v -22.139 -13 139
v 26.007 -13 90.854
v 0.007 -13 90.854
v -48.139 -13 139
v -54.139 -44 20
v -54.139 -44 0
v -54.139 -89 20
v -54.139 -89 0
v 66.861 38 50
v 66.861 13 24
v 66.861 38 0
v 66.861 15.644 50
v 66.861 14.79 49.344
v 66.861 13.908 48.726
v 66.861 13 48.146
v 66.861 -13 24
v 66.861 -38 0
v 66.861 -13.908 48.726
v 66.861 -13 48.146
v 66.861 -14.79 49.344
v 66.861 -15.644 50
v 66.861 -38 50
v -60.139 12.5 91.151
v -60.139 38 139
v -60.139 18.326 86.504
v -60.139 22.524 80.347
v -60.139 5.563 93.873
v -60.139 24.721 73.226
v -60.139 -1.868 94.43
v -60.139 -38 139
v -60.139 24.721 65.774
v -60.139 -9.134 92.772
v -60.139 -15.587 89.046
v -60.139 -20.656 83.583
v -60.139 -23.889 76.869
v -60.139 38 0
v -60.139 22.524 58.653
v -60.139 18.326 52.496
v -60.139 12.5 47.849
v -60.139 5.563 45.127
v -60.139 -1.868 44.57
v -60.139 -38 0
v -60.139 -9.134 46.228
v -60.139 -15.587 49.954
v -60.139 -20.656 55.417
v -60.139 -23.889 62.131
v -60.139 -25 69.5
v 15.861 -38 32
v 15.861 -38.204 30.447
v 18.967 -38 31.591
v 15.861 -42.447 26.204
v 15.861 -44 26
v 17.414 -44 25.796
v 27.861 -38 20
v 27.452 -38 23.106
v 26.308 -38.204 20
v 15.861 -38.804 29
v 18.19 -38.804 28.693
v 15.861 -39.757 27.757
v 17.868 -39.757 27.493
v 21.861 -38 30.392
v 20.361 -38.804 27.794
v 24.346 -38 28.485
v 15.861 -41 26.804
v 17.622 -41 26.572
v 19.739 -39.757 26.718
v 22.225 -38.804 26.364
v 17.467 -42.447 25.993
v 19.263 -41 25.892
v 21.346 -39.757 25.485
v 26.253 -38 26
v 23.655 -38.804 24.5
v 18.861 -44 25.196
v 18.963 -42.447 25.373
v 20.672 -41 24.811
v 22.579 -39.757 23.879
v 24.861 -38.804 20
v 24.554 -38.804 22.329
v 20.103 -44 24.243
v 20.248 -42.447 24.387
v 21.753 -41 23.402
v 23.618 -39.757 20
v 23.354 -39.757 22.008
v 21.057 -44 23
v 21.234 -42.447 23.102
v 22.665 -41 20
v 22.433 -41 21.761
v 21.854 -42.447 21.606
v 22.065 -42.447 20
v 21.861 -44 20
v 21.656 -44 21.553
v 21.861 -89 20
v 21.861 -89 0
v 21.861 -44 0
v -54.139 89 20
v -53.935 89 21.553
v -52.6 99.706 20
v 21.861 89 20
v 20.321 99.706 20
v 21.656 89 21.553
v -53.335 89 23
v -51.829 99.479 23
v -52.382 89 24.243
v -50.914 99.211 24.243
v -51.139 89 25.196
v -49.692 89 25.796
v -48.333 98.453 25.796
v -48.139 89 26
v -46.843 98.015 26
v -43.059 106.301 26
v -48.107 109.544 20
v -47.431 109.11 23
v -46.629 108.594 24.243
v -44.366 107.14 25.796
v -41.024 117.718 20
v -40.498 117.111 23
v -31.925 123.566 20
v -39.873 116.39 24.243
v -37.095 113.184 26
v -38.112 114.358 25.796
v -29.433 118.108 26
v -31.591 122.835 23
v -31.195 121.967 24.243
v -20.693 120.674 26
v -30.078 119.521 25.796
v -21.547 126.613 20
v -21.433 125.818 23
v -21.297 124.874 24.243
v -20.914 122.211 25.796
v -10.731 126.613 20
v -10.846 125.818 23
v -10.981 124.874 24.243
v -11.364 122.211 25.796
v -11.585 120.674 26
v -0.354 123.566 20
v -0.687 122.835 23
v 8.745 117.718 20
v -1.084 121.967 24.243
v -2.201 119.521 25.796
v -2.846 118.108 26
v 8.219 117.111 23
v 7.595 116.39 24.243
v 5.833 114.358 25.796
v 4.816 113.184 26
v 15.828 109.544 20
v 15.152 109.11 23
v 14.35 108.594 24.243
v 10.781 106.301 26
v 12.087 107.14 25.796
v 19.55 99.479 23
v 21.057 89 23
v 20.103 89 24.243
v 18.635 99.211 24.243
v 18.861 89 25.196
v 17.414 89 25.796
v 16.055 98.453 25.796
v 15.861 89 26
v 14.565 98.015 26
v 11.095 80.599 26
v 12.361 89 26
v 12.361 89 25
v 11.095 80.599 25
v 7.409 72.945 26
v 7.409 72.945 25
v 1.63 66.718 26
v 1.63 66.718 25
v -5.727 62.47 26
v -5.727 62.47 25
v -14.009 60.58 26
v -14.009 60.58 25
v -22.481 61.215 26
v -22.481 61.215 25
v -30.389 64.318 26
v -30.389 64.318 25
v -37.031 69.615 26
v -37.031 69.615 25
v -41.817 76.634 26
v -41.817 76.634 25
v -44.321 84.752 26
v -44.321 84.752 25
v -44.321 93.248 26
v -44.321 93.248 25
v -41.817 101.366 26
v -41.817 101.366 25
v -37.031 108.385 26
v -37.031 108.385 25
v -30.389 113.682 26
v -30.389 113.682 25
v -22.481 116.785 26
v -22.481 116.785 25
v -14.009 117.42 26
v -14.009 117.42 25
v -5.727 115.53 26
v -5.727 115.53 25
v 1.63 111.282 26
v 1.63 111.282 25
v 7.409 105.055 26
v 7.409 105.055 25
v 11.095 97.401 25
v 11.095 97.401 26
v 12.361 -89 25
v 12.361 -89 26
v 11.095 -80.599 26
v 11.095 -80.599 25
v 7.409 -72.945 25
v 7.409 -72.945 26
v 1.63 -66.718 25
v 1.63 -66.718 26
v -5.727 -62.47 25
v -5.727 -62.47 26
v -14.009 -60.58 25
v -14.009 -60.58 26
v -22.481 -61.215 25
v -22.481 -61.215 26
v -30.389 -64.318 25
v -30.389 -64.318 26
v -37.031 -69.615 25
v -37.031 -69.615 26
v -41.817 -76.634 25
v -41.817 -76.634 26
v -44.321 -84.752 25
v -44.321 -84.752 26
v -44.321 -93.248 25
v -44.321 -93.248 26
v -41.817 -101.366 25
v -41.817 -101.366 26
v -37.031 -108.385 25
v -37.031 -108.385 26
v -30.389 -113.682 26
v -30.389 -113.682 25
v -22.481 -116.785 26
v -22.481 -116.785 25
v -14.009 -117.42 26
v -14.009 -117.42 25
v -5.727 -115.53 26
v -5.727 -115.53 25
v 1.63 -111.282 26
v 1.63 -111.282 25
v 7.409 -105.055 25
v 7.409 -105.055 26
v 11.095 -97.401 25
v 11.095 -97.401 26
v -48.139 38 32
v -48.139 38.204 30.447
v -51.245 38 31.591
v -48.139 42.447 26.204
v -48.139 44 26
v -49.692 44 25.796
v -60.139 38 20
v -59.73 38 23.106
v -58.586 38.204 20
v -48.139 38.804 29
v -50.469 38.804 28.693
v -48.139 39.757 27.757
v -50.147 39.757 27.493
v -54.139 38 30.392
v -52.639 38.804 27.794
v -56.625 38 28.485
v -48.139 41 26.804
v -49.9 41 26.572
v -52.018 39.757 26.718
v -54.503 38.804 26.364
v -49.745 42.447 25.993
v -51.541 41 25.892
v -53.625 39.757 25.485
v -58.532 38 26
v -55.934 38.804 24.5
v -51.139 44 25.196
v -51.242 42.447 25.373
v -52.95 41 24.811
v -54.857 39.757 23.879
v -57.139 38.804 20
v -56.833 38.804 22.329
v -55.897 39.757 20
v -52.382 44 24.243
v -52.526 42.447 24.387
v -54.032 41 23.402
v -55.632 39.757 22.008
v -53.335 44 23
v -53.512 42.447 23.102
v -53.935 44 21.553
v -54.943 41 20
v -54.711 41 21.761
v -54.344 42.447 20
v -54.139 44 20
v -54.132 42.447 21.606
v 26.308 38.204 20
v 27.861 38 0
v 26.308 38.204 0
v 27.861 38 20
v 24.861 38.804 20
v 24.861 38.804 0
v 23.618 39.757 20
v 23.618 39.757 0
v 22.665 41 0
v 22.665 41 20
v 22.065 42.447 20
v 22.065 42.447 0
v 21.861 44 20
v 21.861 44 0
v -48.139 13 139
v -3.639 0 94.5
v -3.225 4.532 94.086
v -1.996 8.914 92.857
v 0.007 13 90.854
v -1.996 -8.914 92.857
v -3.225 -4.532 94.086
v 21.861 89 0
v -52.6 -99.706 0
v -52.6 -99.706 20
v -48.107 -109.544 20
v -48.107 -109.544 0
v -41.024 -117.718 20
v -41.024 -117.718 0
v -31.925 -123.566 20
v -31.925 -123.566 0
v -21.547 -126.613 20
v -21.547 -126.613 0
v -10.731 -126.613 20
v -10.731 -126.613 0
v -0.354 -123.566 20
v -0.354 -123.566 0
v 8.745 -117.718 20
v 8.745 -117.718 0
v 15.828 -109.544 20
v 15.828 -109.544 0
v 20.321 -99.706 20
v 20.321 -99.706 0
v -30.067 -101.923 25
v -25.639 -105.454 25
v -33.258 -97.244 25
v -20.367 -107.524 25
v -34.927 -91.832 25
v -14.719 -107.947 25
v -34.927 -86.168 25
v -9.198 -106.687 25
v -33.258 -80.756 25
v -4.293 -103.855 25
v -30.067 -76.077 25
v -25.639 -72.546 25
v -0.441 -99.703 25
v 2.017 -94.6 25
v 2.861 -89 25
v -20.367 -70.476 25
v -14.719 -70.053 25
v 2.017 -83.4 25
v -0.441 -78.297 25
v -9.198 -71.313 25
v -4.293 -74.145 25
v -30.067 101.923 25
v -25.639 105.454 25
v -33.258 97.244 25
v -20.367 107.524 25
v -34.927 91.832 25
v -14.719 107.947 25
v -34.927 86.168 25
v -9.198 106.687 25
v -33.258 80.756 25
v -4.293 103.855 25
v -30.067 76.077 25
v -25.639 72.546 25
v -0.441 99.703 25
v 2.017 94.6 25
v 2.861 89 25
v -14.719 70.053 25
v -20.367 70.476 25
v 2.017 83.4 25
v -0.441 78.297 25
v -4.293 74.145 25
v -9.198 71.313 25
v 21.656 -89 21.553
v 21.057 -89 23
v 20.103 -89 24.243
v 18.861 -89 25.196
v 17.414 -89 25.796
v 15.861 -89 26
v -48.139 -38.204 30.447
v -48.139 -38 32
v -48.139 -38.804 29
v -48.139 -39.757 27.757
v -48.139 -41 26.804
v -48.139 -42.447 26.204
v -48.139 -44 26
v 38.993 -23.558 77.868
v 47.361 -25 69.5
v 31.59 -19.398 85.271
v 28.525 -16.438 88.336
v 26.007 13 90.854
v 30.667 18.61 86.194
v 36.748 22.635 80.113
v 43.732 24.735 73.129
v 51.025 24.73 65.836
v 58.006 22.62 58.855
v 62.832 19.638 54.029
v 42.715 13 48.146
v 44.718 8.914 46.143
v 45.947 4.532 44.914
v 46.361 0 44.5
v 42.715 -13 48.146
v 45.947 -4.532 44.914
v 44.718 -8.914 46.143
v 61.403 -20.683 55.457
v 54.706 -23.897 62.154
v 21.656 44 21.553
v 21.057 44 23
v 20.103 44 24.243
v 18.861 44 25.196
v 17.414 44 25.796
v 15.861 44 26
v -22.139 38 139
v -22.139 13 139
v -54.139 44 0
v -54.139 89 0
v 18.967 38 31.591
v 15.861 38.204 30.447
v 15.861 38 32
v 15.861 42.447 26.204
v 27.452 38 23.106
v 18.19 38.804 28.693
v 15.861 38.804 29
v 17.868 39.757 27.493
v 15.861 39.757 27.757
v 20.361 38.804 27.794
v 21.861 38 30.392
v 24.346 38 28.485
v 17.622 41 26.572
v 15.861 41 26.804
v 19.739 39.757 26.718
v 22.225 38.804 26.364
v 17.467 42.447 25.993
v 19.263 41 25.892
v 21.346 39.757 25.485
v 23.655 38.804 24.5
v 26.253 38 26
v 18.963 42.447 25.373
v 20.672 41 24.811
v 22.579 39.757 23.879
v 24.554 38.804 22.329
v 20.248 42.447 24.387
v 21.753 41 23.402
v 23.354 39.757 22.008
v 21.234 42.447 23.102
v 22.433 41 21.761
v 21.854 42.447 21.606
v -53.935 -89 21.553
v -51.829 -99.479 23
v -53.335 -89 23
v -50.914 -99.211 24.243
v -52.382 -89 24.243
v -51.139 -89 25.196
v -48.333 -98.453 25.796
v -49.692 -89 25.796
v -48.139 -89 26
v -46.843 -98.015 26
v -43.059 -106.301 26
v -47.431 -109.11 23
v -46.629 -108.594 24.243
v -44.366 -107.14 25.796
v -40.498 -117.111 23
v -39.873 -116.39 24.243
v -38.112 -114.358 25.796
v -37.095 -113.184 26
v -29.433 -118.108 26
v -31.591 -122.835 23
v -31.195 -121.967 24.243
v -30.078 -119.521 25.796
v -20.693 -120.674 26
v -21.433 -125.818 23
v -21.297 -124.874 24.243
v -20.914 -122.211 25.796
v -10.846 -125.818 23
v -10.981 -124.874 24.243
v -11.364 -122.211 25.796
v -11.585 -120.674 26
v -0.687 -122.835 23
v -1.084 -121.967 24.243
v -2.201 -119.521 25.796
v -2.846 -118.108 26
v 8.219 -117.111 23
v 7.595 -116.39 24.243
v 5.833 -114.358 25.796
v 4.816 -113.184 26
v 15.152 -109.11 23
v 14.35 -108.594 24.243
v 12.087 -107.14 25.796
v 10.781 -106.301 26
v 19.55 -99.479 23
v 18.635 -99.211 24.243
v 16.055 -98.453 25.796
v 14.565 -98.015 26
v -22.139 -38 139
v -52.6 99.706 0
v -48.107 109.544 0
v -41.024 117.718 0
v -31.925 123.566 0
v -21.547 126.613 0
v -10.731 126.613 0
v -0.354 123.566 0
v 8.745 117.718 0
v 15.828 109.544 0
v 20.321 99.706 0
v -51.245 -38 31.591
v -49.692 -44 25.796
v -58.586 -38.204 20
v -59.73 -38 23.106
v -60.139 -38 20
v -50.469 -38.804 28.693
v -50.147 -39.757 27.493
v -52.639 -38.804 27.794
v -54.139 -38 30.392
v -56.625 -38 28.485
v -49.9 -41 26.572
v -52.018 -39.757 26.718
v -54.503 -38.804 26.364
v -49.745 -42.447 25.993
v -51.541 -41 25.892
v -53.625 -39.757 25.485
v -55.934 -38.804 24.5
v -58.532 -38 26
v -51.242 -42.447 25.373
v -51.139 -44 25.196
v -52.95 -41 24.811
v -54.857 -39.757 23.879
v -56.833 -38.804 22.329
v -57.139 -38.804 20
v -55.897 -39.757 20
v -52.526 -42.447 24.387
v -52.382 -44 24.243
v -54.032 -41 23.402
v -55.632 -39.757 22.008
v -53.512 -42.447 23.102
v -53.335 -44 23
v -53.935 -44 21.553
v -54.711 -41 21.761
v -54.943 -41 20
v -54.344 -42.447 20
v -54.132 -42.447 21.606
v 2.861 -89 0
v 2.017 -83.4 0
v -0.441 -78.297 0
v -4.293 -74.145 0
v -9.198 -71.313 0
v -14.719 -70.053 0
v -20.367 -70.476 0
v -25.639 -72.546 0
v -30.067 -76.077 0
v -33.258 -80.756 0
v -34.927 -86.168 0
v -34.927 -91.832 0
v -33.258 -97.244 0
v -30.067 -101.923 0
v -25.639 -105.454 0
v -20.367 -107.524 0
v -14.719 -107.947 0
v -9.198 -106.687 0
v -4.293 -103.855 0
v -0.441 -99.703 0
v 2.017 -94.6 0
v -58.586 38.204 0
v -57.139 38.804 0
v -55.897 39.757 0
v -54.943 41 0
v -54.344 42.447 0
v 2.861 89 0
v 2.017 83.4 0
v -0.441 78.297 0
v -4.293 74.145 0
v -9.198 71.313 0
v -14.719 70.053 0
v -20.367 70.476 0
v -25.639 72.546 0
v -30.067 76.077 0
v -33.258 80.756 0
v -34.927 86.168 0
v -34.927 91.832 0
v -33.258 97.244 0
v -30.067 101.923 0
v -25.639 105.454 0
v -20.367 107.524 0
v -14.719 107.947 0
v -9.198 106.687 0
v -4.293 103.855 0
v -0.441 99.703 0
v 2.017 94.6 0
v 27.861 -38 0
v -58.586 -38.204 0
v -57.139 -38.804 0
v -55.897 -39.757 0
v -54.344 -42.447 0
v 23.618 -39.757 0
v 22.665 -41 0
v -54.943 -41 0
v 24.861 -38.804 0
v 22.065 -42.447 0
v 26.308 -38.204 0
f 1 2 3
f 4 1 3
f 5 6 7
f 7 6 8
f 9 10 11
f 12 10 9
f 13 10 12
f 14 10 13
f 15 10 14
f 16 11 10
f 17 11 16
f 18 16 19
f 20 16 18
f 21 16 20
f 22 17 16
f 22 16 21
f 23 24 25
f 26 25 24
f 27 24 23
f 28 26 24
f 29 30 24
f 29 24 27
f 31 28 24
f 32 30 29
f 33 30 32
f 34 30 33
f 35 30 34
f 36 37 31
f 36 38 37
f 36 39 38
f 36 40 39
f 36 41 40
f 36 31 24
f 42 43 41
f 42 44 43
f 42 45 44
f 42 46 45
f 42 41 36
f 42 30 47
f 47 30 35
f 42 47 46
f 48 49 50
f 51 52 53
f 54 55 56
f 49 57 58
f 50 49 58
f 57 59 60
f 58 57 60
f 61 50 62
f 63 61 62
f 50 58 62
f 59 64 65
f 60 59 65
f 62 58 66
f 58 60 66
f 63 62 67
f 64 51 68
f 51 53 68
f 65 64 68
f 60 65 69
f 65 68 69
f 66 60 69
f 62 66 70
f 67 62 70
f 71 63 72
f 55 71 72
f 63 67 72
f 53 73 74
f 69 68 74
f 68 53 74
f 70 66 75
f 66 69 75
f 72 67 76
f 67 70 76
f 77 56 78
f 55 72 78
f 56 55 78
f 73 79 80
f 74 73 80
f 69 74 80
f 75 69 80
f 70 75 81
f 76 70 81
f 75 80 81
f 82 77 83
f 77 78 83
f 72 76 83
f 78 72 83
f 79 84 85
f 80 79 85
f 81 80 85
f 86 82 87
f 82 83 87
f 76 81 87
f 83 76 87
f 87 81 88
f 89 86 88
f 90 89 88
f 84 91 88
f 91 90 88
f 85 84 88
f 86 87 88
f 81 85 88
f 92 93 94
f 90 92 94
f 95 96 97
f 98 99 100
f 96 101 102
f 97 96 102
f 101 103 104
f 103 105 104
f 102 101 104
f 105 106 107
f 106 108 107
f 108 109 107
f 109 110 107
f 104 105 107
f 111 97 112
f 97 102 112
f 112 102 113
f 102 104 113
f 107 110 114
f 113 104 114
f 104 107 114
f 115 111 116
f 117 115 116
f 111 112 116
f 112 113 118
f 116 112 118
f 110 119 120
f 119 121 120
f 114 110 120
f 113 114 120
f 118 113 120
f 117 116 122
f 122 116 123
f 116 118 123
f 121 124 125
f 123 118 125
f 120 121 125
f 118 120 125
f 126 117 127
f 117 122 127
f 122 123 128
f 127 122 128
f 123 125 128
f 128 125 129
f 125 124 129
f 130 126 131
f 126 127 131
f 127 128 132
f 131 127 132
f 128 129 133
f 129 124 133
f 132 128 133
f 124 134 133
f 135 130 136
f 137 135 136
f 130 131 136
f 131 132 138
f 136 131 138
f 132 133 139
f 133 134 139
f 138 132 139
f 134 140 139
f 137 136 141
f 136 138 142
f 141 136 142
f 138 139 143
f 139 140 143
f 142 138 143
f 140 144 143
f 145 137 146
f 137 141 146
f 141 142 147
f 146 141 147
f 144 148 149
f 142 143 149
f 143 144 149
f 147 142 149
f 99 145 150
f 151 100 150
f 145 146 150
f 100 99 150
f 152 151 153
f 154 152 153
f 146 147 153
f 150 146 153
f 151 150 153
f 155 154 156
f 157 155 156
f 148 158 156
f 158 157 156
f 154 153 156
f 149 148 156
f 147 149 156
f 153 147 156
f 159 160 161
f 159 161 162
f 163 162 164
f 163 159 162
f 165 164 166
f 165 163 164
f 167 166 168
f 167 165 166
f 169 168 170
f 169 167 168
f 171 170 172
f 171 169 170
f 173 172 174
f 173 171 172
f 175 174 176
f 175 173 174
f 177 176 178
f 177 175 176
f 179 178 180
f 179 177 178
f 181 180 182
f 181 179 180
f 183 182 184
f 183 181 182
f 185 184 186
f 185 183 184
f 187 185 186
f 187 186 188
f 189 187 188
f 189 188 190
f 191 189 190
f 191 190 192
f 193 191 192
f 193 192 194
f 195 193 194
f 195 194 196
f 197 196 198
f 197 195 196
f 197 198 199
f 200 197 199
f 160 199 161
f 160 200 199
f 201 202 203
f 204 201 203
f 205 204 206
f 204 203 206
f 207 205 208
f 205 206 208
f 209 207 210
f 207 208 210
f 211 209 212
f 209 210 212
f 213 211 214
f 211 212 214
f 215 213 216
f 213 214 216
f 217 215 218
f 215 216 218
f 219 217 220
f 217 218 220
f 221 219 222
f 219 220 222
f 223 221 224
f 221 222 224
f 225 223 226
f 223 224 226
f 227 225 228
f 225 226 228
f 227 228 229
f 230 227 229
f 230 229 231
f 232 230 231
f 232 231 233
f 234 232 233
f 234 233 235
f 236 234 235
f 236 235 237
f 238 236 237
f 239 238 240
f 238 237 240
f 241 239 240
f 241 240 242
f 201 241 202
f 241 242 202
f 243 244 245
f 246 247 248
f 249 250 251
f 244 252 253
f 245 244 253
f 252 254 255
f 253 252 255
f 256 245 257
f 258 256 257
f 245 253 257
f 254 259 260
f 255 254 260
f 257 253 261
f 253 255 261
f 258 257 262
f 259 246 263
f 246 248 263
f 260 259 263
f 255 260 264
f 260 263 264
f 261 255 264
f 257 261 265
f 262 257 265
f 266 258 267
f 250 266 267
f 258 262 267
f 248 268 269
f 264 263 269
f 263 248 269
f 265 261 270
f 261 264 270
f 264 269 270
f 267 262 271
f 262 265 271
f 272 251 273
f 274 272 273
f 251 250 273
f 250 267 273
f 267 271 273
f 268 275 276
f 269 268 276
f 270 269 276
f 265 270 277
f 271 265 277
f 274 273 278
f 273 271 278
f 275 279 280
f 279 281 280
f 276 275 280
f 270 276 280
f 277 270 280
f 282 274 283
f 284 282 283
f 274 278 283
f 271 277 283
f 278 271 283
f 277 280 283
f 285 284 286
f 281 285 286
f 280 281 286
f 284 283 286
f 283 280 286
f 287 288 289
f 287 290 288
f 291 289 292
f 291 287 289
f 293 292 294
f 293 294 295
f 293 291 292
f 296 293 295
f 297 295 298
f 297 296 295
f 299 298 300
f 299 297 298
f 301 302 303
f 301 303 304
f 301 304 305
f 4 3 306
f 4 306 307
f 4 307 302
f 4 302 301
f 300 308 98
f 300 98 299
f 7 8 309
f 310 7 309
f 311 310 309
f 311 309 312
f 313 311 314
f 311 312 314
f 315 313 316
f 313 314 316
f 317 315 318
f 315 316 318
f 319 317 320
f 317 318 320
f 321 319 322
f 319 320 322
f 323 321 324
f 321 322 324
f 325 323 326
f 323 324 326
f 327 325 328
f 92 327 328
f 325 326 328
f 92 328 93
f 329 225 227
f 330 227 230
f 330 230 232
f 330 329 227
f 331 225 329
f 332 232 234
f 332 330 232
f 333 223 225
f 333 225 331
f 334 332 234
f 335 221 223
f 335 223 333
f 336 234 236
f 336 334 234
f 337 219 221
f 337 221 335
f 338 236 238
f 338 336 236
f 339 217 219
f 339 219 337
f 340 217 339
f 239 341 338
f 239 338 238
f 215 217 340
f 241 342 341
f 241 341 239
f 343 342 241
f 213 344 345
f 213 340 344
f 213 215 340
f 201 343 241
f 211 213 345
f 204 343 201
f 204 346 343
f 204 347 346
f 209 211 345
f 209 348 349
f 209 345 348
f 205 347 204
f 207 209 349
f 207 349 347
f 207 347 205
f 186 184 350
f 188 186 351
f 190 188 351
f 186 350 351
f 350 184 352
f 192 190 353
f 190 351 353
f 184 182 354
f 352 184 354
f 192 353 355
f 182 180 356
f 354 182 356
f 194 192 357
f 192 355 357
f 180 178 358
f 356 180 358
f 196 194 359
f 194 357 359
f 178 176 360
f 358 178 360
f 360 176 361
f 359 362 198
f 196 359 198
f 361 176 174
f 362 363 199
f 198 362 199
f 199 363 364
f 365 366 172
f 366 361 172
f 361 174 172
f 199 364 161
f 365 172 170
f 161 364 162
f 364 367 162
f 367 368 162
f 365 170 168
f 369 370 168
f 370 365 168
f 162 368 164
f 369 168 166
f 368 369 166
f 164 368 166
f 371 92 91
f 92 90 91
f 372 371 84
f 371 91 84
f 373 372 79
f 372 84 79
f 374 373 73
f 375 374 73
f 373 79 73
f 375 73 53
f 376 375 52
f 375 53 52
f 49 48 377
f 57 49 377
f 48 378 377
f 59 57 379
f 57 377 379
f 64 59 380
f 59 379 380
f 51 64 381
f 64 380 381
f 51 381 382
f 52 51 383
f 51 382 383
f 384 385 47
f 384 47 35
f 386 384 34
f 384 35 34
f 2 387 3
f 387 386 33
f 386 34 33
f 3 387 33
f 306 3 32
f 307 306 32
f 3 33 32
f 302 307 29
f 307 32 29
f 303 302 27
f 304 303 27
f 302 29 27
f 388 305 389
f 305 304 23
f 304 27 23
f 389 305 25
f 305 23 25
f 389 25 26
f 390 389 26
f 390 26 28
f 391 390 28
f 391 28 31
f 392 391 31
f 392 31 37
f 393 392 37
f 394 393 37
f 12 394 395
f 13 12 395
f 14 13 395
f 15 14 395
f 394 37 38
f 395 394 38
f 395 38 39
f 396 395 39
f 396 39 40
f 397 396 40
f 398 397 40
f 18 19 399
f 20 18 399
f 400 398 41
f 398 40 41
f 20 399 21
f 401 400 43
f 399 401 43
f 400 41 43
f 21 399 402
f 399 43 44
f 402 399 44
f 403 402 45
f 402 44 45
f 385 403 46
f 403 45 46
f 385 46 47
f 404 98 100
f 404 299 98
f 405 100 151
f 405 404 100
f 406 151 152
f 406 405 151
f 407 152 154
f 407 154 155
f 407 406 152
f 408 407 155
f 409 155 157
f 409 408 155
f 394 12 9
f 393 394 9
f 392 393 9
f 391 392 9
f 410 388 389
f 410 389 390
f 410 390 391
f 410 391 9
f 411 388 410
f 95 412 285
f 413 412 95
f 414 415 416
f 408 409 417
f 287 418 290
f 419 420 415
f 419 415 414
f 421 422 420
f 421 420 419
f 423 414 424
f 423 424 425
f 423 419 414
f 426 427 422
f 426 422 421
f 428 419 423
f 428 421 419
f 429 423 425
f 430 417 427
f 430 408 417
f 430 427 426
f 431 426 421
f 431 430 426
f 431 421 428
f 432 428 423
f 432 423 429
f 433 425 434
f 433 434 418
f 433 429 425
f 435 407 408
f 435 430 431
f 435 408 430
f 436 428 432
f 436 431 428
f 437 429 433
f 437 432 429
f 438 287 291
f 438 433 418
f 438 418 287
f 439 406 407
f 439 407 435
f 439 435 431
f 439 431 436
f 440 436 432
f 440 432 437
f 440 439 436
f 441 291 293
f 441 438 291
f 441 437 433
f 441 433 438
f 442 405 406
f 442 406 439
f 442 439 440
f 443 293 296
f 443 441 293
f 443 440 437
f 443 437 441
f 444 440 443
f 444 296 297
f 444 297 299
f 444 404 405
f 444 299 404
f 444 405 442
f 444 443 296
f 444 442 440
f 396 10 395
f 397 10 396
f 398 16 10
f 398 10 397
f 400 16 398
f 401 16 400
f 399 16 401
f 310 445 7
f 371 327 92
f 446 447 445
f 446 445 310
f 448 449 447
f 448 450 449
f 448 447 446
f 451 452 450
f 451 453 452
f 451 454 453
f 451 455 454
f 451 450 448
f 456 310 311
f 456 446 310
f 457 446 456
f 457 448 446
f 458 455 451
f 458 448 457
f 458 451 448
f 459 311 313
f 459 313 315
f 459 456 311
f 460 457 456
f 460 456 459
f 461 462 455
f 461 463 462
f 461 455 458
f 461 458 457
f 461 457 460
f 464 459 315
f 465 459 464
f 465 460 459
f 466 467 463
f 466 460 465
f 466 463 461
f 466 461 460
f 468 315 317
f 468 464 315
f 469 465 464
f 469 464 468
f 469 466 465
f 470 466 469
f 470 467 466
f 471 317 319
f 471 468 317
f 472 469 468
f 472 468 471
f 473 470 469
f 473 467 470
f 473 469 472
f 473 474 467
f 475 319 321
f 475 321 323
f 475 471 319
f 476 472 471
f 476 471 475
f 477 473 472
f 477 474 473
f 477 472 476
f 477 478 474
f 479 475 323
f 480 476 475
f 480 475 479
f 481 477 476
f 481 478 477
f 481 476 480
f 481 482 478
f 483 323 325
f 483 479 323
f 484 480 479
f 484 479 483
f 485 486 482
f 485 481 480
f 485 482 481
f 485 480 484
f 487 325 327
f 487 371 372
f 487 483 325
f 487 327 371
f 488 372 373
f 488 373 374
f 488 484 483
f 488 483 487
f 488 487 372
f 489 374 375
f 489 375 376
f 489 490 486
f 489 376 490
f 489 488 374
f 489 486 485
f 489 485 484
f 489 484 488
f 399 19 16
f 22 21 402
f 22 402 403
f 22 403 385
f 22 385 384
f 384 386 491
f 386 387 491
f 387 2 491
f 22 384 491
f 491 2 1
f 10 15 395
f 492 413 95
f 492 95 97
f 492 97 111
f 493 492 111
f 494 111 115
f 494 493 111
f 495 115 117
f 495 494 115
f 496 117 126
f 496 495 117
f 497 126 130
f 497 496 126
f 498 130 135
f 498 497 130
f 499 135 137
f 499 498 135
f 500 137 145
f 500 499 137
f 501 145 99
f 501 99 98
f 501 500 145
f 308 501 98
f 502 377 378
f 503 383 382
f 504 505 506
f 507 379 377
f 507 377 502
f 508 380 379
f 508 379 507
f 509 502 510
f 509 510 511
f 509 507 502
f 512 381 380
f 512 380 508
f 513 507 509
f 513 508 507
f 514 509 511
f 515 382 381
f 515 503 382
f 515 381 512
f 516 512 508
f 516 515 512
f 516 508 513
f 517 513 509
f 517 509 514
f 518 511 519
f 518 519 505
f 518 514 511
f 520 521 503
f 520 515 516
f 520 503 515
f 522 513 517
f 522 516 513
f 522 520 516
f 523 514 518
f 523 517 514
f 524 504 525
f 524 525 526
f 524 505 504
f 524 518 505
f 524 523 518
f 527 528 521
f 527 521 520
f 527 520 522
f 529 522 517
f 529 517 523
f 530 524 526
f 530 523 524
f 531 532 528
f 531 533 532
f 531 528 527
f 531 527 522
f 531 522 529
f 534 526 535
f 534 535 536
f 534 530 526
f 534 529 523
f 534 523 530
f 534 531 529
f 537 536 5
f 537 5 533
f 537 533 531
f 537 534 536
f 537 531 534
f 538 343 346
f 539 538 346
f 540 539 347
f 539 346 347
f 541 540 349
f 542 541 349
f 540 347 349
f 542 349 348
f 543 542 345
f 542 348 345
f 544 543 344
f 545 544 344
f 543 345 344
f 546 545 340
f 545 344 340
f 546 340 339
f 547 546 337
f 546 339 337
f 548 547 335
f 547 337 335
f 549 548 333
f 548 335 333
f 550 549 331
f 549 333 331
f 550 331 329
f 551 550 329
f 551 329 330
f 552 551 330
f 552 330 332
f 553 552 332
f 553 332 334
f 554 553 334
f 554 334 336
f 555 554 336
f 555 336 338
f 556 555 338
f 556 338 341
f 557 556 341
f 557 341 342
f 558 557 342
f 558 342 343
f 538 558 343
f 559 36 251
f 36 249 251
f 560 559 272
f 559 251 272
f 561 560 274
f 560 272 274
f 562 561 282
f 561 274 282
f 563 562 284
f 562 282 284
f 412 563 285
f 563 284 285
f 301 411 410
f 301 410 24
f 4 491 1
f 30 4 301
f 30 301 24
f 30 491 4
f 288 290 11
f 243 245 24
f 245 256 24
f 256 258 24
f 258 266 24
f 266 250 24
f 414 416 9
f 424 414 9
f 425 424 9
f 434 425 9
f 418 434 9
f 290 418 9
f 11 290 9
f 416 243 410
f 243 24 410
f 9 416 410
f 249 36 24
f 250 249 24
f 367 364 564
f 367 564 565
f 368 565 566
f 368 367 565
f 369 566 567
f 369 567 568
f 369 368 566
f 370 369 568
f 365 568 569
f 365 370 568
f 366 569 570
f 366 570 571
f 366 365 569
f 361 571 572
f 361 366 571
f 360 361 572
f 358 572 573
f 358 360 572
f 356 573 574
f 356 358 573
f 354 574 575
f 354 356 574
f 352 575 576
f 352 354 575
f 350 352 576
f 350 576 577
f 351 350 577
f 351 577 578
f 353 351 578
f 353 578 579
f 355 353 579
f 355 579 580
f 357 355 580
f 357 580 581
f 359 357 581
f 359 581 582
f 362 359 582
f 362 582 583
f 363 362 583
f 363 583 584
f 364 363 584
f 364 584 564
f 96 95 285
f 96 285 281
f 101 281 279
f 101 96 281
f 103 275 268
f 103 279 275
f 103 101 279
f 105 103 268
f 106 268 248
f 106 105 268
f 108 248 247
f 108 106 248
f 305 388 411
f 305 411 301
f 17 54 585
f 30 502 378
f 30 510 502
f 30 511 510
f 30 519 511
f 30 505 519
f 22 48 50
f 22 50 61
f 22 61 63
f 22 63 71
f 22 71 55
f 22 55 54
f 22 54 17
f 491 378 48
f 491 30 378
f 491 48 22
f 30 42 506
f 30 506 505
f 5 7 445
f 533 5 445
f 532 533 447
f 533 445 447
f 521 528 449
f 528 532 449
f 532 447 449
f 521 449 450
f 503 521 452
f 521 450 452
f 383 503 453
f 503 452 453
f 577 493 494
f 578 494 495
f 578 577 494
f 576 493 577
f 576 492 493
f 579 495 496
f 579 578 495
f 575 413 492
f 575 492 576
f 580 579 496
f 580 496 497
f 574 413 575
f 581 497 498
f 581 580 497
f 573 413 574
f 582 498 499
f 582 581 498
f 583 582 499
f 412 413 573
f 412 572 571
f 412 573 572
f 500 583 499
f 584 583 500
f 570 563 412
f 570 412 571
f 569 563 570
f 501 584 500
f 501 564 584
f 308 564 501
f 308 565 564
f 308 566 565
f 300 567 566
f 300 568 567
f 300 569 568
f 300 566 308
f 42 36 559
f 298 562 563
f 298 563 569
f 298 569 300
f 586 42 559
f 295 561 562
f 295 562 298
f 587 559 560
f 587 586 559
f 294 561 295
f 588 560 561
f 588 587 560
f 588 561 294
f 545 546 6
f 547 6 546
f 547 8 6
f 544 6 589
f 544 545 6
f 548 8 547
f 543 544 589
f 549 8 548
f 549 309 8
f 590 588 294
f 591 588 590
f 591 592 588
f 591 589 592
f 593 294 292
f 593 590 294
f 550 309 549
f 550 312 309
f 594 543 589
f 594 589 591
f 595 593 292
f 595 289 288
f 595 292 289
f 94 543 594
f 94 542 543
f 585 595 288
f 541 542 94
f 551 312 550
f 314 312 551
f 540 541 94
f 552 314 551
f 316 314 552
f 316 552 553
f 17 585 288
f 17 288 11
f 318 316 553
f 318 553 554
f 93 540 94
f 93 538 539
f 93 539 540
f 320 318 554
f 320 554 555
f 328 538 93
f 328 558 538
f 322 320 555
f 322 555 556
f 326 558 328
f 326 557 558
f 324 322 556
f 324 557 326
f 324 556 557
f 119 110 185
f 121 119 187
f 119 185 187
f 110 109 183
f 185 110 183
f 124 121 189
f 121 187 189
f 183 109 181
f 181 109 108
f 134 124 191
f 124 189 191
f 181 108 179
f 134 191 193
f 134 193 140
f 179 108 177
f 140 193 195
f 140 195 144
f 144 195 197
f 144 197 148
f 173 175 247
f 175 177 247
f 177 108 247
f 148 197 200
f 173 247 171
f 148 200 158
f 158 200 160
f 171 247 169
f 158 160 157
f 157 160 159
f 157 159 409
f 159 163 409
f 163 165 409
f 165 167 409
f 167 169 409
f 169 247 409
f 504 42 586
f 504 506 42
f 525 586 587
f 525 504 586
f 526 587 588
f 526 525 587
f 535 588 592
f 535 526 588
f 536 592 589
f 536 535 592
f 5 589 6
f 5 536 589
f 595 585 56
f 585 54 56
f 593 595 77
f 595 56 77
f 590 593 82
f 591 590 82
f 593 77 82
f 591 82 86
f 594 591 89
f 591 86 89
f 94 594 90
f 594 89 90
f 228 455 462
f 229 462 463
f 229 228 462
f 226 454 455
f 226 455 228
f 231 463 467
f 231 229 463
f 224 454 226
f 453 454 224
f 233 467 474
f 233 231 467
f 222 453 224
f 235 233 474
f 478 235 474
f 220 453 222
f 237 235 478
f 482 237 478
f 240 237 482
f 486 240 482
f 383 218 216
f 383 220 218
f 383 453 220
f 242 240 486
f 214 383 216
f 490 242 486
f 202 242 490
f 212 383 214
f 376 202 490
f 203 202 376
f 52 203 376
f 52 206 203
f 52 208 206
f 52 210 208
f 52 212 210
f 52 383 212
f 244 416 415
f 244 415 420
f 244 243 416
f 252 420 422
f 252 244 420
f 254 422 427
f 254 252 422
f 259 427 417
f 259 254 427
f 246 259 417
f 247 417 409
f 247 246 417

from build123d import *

# Parameters (mm, degrees)
F1_DEPTH  = 38
F3_DEPTH  = 13
F5_DEPTH  = 26
F6_R      = 19
F7_DEPTH  = 26.001
F6_R_2    = 28.5
F8_DEPTH  = 1
F9_R      = 5.99999
F11_R     = 25
F12_DEPTH = 127.001


# Not quite as in the source:
# - a fillet or chamfer is up to 0.001 mm smaller than in the source, because OpenCascade refuses the exact size


with BuildPart() as f1:
    # F0 (on Front) → F1 (new body)
    with BuildSketch(Plane.XZ):
        Polygon((-60.1392750332, 139), (-60.1392750332, 0), (66.8607249668, 0), (66.8607249668, 50), (-22.1392750332, 139), align=None)
    extrude(amount=F1_DEPTH)

    # F2 (on face) → F3 (cut)
    with BuildSketch(Plane(origin=(0, 0, 0), x_dir=(-1, 0, 0), z_dir=(0, 1, 0))):
        Polygon((-66.8607249668, 24), (48.1392750332, 139), (22.1392750332, 139), (-66.8607249668, 50), align=None)
    extrude(amount=-F3_DEPTH, mode=Mode.SUBTRACT)

    # F4 (on Top) → F5 (join)
    with BuildSketch(Plane.XY):
        with BuildLine():
            Line((21.8607249668, -38), (-54.1392750332, -38))
            Line((-54.1392750332, -38), (-54.1392750332, -89))
            ThreePointArc((-54.1392750332, -89), (-16.1392750332, -127), (21.8607249668, -89))
            Line((21.8607249668, -89), (21.8607249668, -38))
        make_face()
    extrude(amount=F5_DEPTH)

    # F6 (on face) → F7 (cut, through all)
    with BuildSketch(Plane.XY.offset(26)):
        with Locations((-16.1392750332, -89)):
            Circle(F6_R)
    extrude(amount=-F7_DEPTH, mode=Mode.SUBTRACT)

    # F6 (on face) → F8 (cut)
    with BuildSketch(Plane.XY.offset(26)):
        with Locations((-16.1392750332, -89)):
            Circle(F6_R_2)
        with Locations((-16.1392750332, -89)):
            Circle(F6_R, mode=Mode.SUBTRACT)
    extrude(amount=-F8_DEPTH, mode=Mode.SUBTRACT)

    # F9 (radius 6 in the source; OpenCascade refuses exactly that, so slightly less here)
    f9_edges = [f1.edges().sort_by_distance(p)[0] for p in [
        (-16.139275, -38, 26),
        (21.860725, -38, 13),
        (-54.139275, -38, 13),
        (-54.139275, -63.5, 26),
    ]]
    fillet(f9_edges, radius=F9_R)

    # F10: F1 across plane


with BuildPart() as f1_1:
    add(f1.part)
    add(f1.part.mirror(Plane.XZ))

    # F11 (on face) → F12 (cut, through all)
    with BuildSketch(Plane(origin=(-60.1392750332, 0, 0), x_dir=(0, -1, 0), z_dir=(-1, 0, 0))):
        with Locations((0, 69.5)):
            Circle(F11_R)
    extrude(amount=-F12_DEPTH, mode=Mode.SUBTRACT)


solid = f1_1.part
